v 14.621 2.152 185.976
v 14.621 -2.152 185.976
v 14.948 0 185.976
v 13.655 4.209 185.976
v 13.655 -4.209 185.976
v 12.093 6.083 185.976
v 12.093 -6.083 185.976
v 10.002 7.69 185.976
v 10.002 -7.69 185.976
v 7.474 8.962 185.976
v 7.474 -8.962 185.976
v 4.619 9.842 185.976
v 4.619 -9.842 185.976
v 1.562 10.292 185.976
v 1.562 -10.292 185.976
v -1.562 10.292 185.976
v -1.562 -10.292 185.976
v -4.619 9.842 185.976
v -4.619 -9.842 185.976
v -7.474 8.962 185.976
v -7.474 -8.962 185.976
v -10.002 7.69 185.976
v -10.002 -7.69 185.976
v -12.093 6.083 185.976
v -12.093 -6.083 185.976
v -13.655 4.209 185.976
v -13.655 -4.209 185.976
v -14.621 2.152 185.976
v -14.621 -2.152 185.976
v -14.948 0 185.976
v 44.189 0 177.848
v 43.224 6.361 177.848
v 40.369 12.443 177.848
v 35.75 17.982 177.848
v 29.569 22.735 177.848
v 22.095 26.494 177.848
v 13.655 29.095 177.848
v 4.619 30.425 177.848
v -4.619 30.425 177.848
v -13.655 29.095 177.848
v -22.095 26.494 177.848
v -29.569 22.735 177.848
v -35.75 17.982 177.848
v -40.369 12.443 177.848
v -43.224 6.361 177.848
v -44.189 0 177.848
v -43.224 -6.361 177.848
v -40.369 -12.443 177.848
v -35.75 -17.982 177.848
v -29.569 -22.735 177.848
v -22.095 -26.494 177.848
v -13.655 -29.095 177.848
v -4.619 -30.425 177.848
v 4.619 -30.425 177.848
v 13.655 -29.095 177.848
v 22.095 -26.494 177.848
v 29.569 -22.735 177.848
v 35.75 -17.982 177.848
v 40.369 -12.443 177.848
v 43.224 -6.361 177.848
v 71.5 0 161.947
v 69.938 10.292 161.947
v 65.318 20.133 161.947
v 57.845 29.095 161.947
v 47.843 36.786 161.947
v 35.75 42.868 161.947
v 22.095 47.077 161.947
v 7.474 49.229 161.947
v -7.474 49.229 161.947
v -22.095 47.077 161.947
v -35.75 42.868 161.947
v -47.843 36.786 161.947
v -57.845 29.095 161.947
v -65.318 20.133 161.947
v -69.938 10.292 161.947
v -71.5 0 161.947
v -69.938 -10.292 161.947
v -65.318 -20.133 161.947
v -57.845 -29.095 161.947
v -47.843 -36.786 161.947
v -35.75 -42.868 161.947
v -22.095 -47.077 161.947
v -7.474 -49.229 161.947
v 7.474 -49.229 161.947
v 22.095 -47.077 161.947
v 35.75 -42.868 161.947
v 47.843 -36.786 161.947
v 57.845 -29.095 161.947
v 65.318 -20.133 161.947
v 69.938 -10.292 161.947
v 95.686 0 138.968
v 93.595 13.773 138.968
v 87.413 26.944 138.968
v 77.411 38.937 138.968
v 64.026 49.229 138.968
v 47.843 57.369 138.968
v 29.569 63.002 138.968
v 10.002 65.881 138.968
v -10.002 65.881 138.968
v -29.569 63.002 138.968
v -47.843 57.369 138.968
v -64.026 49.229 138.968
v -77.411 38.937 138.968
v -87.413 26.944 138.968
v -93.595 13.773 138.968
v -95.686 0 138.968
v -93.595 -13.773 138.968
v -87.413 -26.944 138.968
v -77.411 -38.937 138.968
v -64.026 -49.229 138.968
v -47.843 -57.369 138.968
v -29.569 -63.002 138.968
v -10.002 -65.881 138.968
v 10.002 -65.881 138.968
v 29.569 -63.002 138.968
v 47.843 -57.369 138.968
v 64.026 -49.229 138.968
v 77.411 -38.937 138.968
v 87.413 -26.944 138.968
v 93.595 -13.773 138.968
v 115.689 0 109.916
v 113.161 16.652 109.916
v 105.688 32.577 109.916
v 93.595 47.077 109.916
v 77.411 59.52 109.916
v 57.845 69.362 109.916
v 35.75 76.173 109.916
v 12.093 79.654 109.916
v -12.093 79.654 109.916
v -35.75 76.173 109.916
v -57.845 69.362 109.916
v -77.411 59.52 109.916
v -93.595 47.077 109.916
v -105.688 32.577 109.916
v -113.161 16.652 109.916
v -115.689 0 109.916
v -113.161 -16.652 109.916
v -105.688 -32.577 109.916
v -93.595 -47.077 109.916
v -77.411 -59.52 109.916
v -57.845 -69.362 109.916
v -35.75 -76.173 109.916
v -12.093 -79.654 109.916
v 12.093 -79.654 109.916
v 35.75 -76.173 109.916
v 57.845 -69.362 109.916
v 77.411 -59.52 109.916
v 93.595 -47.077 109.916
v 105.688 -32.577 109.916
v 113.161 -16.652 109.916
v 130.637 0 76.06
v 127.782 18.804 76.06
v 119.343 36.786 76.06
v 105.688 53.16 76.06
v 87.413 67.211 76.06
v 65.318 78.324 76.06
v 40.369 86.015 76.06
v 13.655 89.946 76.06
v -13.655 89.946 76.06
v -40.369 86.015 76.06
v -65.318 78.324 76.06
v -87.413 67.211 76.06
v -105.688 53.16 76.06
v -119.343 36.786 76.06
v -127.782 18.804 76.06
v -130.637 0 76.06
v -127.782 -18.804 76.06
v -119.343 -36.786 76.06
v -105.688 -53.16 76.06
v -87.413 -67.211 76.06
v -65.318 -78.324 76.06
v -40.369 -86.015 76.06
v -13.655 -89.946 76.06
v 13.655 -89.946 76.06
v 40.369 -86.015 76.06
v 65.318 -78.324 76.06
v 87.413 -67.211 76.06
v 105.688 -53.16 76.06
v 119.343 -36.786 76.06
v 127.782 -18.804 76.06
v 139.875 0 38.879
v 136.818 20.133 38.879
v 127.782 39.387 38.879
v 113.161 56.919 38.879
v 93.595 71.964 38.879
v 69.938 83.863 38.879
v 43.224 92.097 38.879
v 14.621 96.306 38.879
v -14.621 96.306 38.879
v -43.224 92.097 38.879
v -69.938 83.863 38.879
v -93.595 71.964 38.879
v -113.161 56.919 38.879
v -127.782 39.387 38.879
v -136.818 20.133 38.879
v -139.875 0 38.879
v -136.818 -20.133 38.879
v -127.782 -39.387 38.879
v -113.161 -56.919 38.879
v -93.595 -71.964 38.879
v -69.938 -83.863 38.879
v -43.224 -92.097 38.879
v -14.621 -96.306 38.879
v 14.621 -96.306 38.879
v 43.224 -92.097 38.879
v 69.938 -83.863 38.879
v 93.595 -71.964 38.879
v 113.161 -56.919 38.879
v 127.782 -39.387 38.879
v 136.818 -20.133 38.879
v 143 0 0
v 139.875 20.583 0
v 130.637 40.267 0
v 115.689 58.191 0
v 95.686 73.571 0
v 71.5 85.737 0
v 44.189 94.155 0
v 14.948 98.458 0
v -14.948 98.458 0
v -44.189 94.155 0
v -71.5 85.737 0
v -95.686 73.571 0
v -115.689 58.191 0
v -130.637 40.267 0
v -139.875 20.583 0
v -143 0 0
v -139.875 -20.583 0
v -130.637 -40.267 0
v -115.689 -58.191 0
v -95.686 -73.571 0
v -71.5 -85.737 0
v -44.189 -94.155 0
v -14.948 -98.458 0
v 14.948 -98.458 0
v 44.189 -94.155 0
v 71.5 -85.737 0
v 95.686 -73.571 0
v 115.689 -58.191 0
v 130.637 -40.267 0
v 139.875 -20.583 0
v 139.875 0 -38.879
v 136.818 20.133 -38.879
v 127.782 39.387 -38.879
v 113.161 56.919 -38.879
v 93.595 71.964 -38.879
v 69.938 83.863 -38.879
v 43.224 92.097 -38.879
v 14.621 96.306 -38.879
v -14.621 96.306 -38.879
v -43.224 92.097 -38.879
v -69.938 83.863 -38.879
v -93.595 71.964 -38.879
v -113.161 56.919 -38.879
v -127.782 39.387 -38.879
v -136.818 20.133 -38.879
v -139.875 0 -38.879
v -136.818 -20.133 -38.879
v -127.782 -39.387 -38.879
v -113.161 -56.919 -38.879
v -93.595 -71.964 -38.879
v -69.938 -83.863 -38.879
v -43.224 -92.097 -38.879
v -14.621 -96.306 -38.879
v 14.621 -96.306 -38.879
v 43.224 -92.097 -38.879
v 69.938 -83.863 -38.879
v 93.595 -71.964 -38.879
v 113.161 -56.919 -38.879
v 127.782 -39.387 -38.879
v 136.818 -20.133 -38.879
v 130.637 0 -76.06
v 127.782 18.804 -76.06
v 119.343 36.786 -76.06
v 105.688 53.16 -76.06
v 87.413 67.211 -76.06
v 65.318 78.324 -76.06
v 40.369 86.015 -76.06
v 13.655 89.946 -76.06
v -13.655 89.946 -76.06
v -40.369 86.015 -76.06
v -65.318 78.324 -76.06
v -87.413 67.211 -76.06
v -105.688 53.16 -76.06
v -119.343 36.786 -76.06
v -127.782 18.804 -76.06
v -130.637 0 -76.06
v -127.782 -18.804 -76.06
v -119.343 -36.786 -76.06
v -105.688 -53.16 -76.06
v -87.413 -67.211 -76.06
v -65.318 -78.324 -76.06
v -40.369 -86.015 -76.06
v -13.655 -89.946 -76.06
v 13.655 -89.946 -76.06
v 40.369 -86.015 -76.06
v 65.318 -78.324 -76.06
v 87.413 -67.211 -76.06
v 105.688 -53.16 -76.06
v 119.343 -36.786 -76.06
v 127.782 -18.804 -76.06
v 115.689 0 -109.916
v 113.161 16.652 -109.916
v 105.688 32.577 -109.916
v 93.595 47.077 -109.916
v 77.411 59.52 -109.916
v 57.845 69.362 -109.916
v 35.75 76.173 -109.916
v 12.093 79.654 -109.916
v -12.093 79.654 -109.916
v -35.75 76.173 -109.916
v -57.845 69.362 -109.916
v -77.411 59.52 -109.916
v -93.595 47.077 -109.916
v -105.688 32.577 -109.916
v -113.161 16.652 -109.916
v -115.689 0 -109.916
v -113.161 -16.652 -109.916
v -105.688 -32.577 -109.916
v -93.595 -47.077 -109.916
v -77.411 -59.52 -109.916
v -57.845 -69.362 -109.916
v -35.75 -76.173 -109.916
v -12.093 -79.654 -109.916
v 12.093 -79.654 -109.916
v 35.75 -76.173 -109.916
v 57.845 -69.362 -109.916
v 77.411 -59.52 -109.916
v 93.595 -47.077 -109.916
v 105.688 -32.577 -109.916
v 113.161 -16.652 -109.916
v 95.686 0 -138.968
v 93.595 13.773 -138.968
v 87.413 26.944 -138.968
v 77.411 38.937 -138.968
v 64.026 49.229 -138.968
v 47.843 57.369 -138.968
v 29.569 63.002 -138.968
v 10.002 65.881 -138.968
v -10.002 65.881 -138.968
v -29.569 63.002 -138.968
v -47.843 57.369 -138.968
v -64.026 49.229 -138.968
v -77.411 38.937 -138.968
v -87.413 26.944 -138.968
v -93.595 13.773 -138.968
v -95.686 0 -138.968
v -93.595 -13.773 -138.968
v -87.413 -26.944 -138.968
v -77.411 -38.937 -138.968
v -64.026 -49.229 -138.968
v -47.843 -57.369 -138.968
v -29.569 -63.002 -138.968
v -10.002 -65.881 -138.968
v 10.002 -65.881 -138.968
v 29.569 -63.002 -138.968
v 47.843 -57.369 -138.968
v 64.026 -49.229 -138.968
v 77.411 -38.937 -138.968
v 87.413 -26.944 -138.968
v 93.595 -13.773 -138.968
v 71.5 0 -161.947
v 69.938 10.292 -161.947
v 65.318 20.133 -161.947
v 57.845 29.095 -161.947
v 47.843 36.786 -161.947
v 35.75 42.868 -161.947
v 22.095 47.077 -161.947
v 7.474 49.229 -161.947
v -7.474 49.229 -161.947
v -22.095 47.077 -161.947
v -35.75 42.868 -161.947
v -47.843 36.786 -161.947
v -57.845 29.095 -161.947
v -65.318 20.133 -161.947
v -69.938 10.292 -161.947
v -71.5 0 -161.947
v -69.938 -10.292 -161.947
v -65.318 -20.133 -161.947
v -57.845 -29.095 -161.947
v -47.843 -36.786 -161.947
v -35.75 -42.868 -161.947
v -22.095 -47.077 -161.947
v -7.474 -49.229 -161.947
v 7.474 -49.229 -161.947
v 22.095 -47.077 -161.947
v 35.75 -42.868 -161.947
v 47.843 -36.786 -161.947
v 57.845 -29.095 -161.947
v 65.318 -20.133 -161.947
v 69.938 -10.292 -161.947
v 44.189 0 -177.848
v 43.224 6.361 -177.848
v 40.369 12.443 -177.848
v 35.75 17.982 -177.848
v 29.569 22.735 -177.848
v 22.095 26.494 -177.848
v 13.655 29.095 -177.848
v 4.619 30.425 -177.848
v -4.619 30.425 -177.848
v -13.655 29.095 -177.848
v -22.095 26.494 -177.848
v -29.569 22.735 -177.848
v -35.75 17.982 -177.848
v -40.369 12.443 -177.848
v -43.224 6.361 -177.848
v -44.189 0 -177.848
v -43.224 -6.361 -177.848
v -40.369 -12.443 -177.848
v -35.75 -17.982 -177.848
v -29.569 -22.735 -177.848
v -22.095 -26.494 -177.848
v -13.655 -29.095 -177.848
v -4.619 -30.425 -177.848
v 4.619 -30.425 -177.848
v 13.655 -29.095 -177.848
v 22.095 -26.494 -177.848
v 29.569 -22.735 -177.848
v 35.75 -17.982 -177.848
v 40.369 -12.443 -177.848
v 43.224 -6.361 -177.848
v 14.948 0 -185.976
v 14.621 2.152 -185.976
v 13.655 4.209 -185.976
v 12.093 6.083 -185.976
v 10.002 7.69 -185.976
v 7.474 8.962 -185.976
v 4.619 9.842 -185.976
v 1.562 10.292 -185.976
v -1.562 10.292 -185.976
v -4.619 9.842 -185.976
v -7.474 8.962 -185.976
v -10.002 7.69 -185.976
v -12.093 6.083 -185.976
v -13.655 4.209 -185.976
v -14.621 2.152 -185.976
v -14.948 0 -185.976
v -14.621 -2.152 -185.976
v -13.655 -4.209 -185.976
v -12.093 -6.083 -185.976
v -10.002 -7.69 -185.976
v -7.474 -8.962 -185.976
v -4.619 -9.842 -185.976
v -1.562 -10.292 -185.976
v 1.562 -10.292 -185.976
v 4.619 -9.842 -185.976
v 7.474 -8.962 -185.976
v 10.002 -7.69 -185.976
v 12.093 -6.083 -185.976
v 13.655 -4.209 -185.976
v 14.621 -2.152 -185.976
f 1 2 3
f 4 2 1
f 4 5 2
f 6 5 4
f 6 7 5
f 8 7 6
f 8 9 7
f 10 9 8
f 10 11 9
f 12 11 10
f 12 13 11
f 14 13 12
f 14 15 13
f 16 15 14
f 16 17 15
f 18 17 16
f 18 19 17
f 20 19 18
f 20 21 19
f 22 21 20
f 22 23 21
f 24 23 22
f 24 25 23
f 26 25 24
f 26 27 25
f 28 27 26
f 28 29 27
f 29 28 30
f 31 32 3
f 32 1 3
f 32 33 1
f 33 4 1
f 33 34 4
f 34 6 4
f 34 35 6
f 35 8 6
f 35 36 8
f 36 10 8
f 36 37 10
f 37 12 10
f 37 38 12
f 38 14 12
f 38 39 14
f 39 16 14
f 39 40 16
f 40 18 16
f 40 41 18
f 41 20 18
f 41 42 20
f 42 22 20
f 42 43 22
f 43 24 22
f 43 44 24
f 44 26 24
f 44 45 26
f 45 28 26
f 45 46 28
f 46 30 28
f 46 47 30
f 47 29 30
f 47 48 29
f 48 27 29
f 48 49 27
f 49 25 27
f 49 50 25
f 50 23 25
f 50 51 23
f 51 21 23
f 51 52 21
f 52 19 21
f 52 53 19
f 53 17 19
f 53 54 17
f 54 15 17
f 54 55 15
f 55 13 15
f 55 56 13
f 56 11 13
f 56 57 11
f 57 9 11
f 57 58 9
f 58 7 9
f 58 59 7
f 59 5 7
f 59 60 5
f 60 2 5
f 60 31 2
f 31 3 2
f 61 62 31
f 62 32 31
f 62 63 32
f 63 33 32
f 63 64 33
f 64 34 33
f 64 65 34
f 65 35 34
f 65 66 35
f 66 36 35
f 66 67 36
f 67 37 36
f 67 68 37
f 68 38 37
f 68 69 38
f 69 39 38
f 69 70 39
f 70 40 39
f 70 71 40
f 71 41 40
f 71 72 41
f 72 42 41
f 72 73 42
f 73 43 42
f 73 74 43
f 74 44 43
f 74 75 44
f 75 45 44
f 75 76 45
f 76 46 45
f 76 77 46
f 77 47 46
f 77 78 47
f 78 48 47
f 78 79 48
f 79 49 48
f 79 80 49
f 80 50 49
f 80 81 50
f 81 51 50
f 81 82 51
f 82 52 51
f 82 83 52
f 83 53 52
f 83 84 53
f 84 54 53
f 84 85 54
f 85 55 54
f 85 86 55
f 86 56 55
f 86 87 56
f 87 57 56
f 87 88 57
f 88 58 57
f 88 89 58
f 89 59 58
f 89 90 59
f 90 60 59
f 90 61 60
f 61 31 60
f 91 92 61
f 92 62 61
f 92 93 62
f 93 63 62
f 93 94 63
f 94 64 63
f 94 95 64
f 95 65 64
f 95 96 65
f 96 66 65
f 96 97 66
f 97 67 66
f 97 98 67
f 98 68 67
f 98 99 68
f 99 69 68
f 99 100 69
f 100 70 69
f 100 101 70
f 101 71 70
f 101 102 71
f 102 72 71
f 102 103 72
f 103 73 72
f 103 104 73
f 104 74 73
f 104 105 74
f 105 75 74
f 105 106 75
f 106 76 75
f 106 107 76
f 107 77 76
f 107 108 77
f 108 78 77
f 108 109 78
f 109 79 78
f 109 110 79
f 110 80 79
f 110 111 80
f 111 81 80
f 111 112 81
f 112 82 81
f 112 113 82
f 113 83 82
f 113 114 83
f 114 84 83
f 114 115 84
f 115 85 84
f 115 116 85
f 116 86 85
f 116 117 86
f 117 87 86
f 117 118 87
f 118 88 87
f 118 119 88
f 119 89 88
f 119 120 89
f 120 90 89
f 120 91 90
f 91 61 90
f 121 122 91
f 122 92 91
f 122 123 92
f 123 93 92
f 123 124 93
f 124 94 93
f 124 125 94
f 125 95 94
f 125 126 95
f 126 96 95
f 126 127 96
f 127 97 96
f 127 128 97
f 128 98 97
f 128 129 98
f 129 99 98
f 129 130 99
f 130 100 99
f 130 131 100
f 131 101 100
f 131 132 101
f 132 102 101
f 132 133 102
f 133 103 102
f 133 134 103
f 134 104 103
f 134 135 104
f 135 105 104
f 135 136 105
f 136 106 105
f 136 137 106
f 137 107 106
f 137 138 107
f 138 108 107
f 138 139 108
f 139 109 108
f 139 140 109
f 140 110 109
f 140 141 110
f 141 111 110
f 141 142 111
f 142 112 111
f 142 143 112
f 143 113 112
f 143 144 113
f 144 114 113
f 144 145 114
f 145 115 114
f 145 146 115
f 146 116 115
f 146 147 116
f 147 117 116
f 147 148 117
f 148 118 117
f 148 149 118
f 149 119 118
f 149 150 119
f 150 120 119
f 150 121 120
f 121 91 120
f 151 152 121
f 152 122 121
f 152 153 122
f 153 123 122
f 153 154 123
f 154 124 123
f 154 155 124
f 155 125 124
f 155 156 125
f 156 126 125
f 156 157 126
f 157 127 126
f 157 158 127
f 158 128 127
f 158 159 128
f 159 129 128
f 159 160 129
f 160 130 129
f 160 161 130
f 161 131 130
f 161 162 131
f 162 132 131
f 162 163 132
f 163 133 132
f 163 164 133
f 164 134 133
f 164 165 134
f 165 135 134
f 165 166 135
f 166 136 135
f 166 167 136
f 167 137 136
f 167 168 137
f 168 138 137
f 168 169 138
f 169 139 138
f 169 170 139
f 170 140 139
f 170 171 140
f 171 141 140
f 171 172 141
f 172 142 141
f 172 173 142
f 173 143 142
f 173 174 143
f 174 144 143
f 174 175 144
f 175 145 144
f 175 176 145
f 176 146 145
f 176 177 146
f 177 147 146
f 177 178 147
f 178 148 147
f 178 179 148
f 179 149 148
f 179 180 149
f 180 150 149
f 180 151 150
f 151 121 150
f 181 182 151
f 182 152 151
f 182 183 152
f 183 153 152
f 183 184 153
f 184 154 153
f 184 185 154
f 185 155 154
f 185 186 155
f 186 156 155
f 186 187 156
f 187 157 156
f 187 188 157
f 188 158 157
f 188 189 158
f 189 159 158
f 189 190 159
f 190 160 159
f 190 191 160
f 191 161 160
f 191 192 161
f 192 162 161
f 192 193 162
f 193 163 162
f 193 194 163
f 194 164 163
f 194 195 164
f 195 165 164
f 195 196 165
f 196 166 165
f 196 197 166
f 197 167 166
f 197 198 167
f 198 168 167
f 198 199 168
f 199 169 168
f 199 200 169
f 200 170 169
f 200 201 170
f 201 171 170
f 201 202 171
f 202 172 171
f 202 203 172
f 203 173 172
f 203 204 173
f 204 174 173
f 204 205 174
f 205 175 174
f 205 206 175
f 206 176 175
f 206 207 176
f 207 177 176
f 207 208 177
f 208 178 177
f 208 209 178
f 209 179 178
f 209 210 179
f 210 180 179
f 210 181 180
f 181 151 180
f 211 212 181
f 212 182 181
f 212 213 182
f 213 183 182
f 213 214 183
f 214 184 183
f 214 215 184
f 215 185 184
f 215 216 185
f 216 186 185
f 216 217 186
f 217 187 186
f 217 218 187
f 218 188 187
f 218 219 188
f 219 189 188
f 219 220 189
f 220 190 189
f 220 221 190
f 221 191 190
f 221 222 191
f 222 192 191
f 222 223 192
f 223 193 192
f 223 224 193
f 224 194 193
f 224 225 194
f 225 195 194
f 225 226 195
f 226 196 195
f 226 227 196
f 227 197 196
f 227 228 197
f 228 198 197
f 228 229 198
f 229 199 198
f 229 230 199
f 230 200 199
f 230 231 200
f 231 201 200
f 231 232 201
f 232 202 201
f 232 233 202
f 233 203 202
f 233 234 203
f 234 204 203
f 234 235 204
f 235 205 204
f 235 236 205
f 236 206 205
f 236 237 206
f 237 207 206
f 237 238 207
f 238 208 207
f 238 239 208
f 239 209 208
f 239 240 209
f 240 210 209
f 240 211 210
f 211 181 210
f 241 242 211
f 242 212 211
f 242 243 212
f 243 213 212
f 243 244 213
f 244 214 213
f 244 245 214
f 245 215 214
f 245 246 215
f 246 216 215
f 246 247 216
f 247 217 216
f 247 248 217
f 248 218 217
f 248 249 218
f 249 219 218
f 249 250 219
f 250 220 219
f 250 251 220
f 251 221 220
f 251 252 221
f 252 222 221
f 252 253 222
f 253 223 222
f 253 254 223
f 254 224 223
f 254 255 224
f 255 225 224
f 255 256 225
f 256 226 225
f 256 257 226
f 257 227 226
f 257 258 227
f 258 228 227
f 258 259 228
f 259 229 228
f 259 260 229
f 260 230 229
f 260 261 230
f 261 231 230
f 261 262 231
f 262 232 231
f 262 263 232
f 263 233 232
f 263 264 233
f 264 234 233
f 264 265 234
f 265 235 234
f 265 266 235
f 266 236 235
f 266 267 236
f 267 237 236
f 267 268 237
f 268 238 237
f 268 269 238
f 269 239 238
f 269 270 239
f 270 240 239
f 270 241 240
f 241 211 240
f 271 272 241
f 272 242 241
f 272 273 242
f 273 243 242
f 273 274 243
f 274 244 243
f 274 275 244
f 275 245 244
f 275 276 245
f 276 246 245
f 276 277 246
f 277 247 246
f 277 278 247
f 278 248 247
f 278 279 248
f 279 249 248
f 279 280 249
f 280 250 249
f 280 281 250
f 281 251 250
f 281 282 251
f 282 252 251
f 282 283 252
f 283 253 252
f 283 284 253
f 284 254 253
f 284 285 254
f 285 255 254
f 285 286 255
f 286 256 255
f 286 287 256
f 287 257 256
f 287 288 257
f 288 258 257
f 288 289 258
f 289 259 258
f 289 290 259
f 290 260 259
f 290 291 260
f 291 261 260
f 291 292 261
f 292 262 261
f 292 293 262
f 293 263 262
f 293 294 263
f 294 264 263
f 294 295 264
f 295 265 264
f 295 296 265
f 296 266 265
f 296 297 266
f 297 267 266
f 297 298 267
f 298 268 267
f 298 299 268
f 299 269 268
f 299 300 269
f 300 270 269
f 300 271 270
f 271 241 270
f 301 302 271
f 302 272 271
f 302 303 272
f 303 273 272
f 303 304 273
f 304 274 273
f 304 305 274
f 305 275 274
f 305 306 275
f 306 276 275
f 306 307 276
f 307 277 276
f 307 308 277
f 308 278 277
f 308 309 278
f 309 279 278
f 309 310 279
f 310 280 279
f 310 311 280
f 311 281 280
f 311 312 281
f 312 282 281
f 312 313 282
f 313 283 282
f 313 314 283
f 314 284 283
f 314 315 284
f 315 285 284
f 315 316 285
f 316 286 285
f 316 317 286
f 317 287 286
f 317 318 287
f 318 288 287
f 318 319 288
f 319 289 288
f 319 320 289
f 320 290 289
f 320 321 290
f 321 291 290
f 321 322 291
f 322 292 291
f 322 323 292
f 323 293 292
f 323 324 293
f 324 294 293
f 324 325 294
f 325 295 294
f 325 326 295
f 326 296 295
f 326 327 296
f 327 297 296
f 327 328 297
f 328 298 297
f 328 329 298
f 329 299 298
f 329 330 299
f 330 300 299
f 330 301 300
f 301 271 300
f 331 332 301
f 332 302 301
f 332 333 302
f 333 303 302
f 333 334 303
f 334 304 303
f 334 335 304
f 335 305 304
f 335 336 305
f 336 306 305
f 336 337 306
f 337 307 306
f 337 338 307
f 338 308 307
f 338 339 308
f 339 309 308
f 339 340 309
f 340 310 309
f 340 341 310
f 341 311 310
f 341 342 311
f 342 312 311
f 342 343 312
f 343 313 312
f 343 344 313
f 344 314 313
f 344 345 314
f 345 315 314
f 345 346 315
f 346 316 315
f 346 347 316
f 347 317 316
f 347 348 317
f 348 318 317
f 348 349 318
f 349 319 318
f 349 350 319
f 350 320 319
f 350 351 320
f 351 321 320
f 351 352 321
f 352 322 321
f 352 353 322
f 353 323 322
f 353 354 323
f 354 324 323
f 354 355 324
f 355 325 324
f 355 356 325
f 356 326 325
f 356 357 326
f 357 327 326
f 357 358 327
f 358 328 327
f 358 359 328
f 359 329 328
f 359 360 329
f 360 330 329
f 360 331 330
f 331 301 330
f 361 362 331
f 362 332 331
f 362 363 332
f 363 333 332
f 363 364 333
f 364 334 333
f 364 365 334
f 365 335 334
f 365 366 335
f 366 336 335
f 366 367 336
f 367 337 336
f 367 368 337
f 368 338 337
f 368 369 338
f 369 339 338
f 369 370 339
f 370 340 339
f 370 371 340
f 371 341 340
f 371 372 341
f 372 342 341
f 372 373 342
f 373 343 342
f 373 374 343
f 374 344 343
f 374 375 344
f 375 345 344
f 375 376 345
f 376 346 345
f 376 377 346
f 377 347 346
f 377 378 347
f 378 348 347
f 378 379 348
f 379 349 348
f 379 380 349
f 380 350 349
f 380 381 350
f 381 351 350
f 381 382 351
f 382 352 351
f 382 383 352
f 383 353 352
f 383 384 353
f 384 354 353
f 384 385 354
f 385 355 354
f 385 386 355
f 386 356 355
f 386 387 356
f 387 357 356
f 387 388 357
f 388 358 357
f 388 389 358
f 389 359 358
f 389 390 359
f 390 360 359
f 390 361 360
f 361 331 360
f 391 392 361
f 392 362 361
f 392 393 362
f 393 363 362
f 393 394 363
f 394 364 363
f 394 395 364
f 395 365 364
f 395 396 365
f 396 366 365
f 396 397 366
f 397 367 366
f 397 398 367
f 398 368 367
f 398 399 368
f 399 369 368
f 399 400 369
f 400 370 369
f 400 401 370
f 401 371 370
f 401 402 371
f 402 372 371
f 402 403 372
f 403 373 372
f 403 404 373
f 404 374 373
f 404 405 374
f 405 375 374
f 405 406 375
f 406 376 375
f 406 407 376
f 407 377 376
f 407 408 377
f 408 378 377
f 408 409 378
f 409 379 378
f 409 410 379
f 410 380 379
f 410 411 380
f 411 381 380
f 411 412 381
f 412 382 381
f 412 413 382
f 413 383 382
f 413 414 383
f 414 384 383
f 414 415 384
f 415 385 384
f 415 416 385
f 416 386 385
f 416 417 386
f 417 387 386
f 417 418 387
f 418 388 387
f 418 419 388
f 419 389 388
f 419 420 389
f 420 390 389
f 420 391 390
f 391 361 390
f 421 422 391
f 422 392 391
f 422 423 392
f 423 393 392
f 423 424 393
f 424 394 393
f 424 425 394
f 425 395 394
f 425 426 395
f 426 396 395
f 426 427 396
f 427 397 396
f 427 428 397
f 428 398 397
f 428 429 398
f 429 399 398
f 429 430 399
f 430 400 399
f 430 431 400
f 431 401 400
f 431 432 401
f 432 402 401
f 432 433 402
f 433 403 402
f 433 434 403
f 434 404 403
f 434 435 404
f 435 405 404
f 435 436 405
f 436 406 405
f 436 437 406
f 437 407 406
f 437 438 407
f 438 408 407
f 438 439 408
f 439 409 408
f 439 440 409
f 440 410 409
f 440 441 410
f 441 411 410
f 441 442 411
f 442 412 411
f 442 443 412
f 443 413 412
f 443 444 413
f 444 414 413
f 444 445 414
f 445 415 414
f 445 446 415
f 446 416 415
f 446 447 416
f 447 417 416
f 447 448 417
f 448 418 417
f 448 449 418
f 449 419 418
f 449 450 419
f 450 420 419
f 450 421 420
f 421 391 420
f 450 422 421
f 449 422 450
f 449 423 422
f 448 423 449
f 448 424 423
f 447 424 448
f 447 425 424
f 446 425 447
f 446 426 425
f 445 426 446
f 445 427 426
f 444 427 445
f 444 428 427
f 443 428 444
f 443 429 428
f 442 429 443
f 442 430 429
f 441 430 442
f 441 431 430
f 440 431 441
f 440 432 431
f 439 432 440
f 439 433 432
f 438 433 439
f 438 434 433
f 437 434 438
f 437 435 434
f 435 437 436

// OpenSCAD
// Generated by SolidPython 1.0.1 on 2020-07-29 00:46:50


scale(v = [13, 9, 17]) {
	sphere(r = 11);
}
/***********************************************
*********      SolidPython code:      **********
************************************************
 
# import packages: SolidPython
from solid import *
from solid.utils import *
from itertools import chain, combinations, permutations


class Resize:

    def __init__(self, scad_file):
        self.scad_file = scad_file
        #self.scad_file = import_scad(scad_file)
        # cone/cylinder param:
        self.r1 = 0
        self.r2 = 0
        self.h = 0
        # rectangular prism param:
        self.w = 0
        self.l = 0
        # ellipse param:
        self.r = 0

    # import OpenScad code (file name corresponds to shape)


    # classify shape + parameters
    def assign(self, param1, param2, param3):
        if self.scad_file == 'cone.scad':
            self.r1 = param1
            self.r2 = param2
            self.h = param3
        elif self.scad_file == 'cylinder.scad':
            self.r1 = param1
            self.r2 = param2
            self.h = param3
        elif self.scad_file == 'rectangularPrism.scad':
            self.h = param1
            self.l = param2
            self.w = param3
        else:
            self.r = param1
            self.h = param2

    # resize parameters
    def iterate(self):
        x = range(3, 20, 2)
        i = 1
        if self.scad_file == 'cone.scad':
            tempList = list(permutations(x, 2))
            for temp in tempList:
                param1 = temp[0]
                param2 = temp[1]
                filepath = 'produced_scad_files/' + 'cone' + str(param1) + '_' + str(param2) + '_' + '.scad'
                scad_render_to_file(cylinder(h=param1, r1=param2, r2=0), filepath)

        elif self.scad_file == 'cylinder.scad':
            tempList = list(permutations(x, 3))
            for temp in tempList:
                param1 = temp[0]
                param2 = temp[1]
                filepath = 'produced_scad_files/' + 'cylinder' + str(param1) + '_' + str(param2) + '_' + '.scad'
                scad_render_to_file(cylinder(h=param1, r1=param2, r2=param2), filepath)

        elif self.scad_file == 'rectangularPrism.scad':
            tempList = list(permutations(x, 3))
            for temp in tempList:
                param1 = temp[0]
                param2 = temp[1]
                param3 = temp[2]
                filepath = 'produced_scad_files/' + 'rectangularPrism' + str(param1) + '_' + str(param2) + '_' + str(
                    param3) + '.scad'
                scad_render_to_file(cube(size=(param1, param2, param3)), filepath)

        elif self.scad_file == 'ellipse.scad':
            tempList = list(permutations(x, 4))
            for temp in tempList:
                param1 = temp[0]
                param2 = temp[1]
                param3 = temp[2]
                param4 = temp[3]
                filepath = 'produced_scad_files/' + 'ellipse' + str(param1) + '_' + str(param2) + '_' + str(param3) + '_' + str(param4) + '.scad'
                scad_render_to_file(scale([param1, param2, param3])(sphere(r=param4)), filepath)

    def render_to_scadfile(self):
        scad_render_to_file(scad, 'example.scad') 
 
************************************************/
